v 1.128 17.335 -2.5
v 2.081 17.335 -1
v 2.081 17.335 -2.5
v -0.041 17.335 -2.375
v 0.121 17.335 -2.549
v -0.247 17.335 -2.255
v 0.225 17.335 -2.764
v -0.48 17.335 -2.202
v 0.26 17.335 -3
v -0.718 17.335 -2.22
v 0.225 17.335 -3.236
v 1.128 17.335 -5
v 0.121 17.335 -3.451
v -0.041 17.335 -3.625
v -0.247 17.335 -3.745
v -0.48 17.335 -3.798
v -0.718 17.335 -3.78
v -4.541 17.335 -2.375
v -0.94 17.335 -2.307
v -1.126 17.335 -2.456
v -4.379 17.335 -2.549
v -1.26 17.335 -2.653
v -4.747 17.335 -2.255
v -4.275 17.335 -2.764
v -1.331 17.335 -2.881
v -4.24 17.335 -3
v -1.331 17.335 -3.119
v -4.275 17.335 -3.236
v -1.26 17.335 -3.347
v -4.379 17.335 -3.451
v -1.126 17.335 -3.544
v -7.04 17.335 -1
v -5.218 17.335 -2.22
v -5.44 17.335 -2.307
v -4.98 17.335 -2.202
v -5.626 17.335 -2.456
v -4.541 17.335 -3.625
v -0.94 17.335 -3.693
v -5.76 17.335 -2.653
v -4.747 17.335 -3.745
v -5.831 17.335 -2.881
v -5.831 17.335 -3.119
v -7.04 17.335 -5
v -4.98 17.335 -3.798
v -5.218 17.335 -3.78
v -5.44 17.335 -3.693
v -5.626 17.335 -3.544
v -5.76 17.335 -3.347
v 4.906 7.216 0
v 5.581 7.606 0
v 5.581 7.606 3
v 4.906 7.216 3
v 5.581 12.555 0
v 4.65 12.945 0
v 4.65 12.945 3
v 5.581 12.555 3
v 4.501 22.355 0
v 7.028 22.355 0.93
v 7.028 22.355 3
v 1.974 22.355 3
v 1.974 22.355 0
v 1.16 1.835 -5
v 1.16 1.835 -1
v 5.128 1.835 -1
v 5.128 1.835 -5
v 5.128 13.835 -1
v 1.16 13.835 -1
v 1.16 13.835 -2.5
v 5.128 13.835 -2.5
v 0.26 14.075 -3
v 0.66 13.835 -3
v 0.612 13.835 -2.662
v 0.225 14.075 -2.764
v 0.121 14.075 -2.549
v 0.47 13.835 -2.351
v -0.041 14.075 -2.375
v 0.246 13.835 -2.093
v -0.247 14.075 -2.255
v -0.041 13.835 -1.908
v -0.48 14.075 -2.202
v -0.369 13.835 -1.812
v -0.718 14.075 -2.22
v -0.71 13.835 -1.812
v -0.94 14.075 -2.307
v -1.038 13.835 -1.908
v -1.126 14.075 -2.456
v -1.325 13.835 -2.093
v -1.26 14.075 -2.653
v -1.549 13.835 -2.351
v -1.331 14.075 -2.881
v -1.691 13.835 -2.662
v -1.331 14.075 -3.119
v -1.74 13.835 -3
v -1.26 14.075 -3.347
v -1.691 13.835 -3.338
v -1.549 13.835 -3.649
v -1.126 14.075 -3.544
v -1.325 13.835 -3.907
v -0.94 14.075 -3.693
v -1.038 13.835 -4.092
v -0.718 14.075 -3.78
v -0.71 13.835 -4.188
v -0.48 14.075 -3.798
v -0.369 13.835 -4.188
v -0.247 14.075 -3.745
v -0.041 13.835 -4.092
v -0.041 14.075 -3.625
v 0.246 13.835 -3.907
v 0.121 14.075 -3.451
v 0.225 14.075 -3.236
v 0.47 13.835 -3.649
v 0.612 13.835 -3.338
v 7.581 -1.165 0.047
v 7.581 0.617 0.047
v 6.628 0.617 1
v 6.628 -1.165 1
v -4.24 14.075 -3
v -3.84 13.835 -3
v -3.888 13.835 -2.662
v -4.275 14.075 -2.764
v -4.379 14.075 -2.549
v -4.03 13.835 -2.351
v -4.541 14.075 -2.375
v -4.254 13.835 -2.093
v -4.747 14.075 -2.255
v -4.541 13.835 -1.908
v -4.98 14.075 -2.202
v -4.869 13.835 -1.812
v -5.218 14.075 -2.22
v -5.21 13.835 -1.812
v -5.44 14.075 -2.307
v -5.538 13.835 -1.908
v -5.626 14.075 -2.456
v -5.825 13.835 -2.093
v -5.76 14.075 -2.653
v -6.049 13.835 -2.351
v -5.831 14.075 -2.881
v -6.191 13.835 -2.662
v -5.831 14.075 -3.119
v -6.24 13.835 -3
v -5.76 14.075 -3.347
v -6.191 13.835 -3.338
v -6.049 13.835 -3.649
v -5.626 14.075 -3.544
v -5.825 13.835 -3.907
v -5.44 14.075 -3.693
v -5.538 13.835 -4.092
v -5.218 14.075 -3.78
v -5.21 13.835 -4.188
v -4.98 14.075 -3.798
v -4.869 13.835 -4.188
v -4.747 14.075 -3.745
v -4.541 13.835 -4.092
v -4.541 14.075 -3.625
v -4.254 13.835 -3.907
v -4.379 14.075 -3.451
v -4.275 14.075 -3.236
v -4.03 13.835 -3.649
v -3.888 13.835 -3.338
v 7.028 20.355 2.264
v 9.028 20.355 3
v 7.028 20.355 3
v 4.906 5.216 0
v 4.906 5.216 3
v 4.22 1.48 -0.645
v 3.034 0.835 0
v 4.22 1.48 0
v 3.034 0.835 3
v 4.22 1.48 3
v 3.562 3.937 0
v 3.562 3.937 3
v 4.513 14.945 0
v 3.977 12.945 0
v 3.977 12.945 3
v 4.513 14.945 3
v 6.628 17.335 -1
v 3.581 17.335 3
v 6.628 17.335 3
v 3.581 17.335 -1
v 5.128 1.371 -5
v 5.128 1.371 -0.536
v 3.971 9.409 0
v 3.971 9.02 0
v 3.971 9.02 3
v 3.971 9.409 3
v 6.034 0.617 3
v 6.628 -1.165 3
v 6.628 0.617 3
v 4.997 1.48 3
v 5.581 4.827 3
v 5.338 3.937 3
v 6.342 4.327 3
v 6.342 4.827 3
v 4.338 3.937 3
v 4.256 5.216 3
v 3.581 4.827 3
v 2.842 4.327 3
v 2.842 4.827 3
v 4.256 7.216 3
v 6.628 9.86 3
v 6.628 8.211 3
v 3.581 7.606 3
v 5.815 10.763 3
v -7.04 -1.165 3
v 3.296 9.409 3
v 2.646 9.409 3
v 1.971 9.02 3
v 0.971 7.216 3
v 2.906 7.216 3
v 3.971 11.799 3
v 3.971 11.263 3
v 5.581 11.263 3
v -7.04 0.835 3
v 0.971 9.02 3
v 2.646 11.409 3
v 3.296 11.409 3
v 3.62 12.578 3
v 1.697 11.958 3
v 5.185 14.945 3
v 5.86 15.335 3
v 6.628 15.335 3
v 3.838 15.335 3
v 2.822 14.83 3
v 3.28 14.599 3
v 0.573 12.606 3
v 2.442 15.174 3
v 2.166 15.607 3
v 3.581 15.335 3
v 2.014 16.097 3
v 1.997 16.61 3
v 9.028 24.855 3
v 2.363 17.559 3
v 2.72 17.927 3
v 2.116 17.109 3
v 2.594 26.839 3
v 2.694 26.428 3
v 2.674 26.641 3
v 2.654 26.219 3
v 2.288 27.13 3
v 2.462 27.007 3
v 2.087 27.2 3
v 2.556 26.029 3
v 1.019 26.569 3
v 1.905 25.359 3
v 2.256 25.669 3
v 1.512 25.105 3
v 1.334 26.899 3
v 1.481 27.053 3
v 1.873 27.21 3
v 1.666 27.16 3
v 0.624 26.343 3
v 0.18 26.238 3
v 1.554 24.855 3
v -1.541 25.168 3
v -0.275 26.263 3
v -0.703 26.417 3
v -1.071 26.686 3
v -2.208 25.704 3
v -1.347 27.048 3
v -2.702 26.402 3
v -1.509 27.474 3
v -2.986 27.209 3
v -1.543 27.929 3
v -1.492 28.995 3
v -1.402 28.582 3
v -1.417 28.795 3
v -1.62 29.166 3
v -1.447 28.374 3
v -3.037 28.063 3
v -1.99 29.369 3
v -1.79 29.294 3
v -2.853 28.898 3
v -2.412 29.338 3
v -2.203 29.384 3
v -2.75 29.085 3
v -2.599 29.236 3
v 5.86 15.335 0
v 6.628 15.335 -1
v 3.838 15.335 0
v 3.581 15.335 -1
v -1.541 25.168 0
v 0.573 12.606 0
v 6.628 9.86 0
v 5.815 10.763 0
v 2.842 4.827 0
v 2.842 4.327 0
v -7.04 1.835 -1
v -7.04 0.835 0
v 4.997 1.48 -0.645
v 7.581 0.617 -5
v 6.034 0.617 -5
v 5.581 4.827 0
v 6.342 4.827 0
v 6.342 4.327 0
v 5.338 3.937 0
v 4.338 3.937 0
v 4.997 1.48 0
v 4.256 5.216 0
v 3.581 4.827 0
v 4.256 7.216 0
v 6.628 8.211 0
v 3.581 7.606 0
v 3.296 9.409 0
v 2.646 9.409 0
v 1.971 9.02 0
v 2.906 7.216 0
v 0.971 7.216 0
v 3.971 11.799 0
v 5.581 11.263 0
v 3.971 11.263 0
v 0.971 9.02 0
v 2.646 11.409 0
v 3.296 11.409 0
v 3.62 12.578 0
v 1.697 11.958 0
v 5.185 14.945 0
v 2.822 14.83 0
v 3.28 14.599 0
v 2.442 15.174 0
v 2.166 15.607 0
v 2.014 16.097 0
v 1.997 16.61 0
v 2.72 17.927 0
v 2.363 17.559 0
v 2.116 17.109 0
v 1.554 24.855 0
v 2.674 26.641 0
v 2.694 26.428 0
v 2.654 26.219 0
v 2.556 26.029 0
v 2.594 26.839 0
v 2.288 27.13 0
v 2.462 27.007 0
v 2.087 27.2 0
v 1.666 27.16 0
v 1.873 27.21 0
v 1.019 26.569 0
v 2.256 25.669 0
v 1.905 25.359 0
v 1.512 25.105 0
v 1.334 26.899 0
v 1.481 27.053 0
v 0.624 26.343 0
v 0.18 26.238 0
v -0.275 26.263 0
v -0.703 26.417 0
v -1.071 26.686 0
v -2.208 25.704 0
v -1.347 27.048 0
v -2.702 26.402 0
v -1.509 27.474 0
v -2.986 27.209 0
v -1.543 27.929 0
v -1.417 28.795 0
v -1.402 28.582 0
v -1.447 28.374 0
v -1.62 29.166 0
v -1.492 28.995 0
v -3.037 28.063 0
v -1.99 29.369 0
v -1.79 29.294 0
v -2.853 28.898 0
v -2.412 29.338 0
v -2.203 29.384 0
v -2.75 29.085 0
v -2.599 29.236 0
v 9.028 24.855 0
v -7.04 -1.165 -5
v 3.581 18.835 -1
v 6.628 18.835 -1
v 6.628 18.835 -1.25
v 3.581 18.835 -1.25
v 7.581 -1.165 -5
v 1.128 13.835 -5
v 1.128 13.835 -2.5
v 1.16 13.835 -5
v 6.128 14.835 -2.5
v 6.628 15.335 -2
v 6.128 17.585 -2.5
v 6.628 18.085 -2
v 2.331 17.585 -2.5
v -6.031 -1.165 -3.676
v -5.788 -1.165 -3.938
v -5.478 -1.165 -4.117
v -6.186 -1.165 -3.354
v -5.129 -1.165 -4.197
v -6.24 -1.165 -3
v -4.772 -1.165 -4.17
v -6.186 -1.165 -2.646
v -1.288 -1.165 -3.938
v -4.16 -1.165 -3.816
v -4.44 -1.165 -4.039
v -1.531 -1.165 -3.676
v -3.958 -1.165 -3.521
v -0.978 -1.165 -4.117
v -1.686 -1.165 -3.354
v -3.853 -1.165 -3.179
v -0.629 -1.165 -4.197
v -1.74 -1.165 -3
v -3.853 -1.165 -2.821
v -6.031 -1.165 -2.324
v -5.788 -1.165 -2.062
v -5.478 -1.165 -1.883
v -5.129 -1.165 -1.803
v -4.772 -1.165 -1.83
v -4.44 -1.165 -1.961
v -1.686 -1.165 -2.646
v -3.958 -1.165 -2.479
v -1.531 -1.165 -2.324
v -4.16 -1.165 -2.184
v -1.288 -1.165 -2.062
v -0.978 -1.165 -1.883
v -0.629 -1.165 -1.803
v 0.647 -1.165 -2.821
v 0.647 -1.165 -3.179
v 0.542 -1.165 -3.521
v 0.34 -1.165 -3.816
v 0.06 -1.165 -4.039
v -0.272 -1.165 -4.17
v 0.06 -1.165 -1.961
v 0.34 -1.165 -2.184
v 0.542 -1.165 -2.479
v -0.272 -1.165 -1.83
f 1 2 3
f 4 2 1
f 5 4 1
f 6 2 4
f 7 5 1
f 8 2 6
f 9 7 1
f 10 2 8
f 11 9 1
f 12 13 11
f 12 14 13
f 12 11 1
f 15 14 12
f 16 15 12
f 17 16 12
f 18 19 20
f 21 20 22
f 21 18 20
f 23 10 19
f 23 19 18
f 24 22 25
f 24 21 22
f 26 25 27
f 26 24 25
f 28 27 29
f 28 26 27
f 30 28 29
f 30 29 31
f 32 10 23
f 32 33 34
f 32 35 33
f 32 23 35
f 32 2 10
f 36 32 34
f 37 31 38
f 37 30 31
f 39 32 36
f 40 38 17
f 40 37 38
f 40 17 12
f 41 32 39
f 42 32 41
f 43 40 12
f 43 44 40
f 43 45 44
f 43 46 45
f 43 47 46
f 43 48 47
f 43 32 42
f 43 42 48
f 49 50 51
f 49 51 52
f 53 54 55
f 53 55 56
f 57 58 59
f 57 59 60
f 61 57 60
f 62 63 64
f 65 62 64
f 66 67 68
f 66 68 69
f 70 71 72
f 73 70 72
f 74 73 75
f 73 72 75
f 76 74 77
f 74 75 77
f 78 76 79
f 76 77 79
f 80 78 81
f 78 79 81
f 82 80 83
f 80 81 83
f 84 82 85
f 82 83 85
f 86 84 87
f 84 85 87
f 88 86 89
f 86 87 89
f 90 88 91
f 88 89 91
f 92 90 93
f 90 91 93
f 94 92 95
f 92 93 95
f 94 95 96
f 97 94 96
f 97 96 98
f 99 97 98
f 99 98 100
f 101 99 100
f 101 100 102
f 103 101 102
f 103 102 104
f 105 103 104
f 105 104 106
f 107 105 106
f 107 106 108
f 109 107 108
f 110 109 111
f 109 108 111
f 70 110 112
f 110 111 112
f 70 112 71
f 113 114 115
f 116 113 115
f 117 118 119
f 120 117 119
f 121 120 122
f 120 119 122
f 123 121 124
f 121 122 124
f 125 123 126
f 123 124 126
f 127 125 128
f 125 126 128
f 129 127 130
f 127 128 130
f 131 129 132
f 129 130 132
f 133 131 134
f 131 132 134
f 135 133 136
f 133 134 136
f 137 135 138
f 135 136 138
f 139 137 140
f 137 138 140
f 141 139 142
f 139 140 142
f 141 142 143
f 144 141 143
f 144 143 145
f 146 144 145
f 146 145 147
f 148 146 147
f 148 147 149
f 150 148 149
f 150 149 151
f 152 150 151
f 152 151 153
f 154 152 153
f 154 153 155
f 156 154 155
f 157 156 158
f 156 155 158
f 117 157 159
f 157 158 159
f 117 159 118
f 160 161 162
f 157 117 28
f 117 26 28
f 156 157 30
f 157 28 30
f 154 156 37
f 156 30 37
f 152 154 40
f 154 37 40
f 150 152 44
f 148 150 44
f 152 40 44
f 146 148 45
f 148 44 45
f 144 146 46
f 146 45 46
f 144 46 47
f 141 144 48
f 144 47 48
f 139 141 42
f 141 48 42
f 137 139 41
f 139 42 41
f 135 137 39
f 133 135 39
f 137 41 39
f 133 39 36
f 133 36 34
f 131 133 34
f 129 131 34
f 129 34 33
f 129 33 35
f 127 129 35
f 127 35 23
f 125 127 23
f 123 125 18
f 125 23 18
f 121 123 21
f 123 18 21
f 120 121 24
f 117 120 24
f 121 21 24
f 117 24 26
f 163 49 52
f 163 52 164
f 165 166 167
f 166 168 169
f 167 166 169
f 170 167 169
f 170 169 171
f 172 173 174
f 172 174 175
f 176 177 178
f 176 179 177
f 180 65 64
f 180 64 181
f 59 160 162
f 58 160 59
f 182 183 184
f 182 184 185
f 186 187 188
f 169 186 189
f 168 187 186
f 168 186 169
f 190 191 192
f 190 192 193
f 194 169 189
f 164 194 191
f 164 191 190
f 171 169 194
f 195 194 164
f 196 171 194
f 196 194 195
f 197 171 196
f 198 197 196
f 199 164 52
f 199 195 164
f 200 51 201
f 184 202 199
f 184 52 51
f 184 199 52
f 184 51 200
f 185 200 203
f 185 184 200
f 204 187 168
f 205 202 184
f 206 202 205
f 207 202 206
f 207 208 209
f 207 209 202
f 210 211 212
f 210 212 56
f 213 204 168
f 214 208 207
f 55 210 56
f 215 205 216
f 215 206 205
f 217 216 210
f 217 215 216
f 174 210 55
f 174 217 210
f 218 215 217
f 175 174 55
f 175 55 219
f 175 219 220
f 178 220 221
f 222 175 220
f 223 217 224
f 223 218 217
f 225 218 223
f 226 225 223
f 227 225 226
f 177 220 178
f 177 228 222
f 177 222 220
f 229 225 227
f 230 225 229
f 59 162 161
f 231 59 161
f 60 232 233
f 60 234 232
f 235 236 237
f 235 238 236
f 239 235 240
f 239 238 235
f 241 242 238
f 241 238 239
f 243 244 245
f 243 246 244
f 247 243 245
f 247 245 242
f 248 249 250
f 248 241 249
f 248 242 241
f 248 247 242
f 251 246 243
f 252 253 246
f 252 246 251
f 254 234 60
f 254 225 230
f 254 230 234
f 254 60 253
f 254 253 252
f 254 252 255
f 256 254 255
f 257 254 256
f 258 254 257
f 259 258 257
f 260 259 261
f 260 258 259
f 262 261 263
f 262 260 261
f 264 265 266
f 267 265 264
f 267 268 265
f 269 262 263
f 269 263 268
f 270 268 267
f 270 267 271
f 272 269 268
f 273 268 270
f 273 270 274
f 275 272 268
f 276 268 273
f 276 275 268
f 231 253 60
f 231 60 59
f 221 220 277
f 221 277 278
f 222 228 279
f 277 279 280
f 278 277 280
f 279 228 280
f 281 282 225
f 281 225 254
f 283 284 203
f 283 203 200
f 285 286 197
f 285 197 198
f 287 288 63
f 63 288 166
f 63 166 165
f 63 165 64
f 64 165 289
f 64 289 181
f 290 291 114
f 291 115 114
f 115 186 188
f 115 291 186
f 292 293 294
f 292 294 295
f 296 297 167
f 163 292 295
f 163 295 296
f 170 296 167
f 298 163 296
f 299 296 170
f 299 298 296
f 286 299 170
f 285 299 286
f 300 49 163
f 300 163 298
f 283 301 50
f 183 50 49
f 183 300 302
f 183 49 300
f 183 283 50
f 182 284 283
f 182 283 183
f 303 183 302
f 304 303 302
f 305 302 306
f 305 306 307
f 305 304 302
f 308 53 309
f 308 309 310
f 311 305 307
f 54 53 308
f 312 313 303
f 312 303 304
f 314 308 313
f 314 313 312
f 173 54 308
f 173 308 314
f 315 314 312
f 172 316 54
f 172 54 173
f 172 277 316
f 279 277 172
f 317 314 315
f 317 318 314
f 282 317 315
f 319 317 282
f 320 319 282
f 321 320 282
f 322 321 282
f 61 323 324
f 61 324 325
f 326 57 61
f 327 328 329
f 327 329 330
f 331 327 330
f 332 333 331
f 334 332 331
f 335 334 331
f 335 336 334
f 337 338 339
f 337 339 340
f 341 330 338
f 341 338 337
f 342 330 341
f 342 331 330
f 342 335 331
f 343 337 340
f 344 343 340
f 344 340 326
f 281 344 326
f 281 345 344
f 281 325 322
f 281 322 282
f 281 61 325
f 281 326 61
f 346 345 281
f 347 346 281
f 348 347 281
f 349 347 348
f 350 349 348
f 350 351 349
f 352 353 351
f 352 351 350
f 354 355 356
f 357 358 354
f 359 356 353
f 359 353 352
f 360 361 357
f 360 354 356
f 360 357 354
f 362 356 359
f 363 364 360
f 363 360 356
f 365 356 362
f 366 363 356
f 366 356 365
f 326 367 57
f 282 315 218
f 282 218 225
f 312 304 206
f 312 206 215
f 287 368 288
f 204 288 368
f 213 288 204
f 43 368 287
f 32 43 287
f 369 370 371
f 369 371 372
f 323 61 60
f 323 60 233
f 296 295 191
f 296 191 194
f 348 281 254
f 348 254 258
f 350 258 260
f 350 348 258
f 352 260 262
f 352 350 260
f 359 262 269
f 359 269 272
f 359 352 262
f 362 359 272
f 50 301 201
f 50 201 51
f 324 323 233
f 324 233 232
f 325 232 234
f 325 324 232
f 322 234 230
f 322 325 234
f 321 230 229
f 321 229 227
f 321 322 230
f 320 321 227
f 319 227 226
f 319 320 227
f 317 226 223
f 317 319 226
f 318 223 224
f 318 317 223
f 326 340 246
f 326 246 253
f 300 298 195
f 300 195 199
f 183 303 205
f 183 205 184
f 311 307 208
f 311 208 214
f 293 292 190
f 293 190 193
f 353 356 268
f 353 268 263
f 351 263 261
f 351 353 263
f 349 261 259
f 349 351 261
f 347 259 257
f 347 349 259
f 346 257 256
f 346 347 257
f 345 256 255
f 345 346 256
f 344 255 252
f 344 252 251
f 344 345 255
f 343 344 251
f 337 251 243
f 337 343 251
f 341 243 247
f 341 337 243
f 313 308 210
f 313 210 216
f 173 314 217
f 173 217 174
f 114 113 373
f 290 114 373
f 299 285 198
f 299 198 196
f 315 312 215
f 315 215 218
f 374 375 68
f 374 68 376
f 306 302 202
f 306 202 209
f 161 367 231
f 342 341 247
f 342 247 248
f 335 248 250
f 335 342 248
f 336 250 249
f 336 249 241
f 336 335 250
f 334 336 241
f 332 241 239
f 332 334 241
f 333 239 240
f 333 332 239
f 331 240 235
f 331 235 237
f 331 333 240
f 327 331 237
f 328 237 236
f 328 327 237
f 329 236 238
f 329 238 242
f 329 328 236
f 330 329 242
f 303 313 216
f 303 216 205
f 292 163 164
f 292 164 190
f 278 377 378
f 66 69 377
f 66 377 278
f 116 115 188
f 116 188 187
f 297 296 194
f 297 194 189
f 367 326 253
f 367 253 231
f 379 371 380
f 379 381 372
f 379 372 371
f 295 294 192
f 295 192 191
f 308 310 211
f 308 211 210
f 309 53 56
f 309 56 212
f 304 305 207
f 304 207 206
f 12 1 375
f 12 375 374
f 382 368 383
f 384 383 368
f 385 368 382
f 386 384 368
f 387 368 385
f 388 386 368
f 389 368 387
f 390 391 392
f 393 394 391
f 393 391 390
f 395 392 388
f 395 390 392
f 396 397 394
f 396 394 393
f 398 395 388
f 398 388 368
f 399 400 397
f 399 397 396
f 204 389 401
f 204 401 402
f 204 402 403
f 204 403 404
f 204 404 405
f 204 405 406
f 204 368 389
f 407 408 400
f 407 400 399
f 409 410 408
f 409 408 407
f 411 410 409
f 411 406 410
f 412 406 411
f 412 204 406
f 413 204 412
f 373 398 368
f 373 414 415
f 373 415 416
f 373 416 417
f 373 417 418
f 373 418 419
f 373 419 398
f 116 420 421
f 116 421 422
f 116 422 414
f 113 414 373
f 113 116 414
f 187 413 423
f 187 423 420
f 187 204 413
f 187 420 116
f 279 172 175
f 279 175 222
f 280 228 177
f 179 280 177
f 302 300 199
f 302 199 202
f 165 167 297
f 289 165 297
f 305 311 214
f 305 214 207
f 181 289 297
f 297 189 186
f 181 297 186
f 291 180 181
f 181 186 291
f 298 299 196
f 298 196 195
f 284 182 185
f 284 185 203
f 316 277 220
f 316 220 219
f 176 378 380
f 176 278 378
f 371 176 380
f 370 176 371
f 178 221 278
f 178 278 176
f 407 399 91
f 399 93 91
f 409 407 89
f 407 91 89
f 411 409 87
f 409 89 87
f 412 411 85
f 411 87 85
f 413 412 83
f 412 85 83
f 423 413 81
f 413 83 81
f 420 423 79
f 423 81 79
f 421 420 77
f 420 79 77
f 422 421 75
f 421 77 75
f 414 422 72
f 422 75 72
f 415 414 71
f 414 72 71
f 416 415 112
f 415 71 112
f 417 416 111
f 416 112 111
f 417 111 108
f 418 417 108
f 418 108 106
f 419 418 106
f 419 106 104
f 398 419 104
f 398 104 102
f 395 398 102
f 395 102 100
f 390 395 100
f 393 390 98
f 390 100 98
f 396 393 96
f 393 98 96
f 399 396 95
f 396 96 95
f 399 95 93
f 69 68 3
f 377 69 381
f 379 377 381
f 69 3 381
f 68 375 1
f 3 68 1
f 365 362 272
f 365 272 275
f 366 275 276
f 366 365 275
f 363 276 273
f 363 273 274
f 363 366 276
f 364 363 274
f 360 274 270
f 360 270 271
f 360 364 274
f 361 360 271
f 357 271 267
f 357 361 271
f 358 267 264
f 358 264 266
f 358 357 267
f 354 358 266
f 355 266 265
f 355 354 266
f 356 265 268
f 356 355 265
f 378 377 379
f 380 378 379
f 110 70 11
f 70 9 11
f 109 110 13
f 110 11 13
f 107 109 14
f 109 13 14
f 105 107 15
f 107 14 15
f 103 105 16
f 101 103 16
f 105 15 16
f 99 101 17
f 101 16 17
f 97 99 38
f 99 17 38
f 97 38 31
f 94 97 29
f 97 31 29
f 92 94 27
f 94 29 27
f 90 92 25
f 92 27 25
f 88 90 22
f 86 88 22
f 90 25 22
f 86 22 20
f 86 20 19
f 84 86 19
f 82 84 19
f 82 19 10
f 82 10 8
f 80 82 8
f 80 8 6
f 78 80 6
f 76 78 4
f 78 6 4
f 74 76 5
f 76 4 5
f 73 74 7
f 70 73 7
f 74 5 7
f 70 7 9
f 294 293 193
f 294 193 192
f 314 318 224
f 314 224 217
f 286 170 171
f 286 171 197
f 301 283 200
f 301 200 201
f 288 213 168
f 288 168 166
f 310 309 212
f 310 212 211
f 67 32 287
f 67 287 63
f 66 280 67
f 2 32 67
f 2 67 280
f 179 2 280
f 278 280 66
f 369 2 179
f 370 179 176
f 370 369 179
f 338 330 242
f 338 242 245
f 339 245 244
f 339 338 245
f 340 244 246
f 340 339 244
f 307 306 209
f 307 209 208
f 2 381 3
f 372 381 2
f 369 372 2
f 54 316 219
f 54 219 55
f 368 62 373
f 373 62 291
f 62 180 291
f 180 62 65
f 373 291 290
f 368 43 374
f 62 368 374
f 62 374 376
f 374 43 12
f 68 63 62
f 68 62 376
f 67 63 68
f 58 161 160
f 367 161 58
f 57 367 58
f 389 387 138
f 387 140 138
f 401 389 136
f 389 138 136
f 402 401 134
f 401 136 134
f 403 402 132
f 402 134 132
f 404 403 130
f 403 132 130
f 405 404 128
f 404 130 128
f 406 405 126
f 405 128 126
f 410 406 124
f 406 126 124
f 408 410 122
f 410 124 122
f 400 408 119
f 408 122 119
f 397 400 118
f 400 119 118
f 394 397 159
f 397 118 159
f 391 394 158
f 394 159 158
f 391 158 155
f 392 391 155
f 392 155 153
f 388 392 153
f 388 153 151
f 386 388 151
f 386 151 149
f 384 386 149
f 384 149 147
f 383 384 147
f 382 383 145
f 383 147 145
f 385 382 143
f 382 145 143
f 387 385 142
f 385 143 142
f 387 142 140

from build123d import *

# Parameters (mm, degrees)
BOSS_SWITCH_BODY_DEPTH                    = 3
SKETCH1_W                                 = 4
SKETCH1_H                                 = 3.5
BOSS_FLANGE_WIDTH_DEPTH                   = 5
BOSS_FLANGE_HEIGHT_REACH                  = 35.863
SKETCH2_W                                 = 4
SKETCH2_H                                 = 2
SKETCH2_W_2                               = 8
CUT_UP_TO_DOWN_DERAILLEUR_CLEARANCE_REACH = 21.462
SKETCH10_W                                = 2.453096586
SKETCH10_H                                = 3
SKETCH17_W                                = 12.1675
SKETCH17_H                                = 4
BOSS_FLANGE_SUPPORT_DEPTH                 = 14.499999955
TAP_DRILL_FOR_M2X0_4_TAP1_D               = 1.6
M2_CLEARANCE_HOLE2_D                      = 2.4
M2_CLEARANCE_HOLE2_DEPTH                  = 15
M2_CLEARANCE_HOLE2_TIP                    = 0.721032743
CHAMFER_FLANGE_SUPPORT_SIZE               = 1.5
CHAMFER_FLANGE_SUPPORT_2_SIZE             = 1.5
CHAMFER_FLANGE_SUPPORT_3_SIZE             = 1
SKETCH23_W                                = 3.9675
SKETCH23_H                                = 11.999999954
CUT_GAP_FOR_PRINTING_DEPTH                = 32.000499688
SKETCH25_W                                = 0.953096586
SKETCH25_H                                = 3.5
CUT_DERAILLEUR_CLEARANCE_DEPTH            = 32.145320369
CHAMFER8_SIZE                             = 1
CUT_UP_TO_DOWN_CANTILEVER_SLOPE_REACH     = 31.869
SKETCH26_W                                = 12.477246204
SKETCH26_H                                = 5.771077126
CUT_WIDE_DERAILLEUR_CLEARANCE_DEPTH       = 33.195879702
CUT_WIDE_DERAILLEUR_CLEARANCE_DEPTH_BACK  = 4
SKETCH27_W                                = 2.5
SKETCH27_H                                = 5.000000046
CHAMFER9_SIZE                             = 1.25
SKETCH28_W                                = 3.046903414
SKETCH28_H                                = 1.5
CUT_EXTRUDE1_DEPTH                        = 1


# Some blends are built 0.0001 mm under size
with BuildPart() as part:
    # Sketch-SwitchBossUp → Boss-Switch Body (new body)
    with BuildSketch(Plane.XY):
        with BuildLine():
            Line((5.581091201, 12.55524379), (5.581100766, 11.263016279))
            Line((5.581100766, 11.263016279), (3.971265023, 11.263016279))
            Line((3.971265023, 11.263016279), (3.97126394, 11.79911022))
            Line((3.97126394, 11.79911022), (3.296271341, 11.409403061))
            Line((3.296271341, 11.409403061), (3.296271341, 9.409403061))
            Line((3.296271341, 9.409403061), (3.971278743, 9.019687356))
            Line((3.971278743, 9.019687356), (3.971278743, 9.409408058))
            Line((3.971278743, 9.409408058), (5.815189336, 10.763016279))
            Line((5.815189336, 10.763016279), (6.627976927, 9.860324207))
            Line((6.627976927, 9.860324207), (6.627976927, 8.210536506))
            Line((6.627976927, 8.210536506), (5.581127833, 7.606137899))
            Line((5.581127833, 7.606137899), (4.906138119, 7.216432406))
            Line((4.906138119, 7.216432406), (4.906138119, 5.216432406))
            Line((4.906138119, 5.216432406), (5.58114552, 4.826716701))
            Line((5.58114552, 4.826716701), (6.342350466, 4.826716701))
            Line((6.342350466, 4.826716701), (6.342350466, 4.326716701))
            Line((6.342350466, 4.326716701), (5.338261222, 3.937018274))
            Line((5.338261222, 3.937018274), (4.338261222, 3.937018274))
            Line((4.338261222, 3.937018274), (4.996687221, 1.479738993))
            Line((4.996687221, 1.479738993), (6.034464198, 0.616519013))
            Line((6.034464198, 0.616519013), (6.627976927, 0.616519013))
            Line((6.627976927, 0.616519013), (6.627976927, -1.165310653))
            Line((6.627976927, -1.165310653), (3.034464198, -1.165310653))
            Line((3.034464198, -1.165310653), (3.034464198, 0.834689347))
            Line((3.034464198, 0.834689347), (4.220230086, 1.479738993))
            Line((4.220230086, 1.479738993), (3.561804087, 3.937018274))
            Line((3.561804087, 3.937018274), (2.842350466, 4.326720436))
            Line((2.842350466, 4.326720436), (2.842350466, 4.826720436))
            Line((2.842350466, 4.826720436), (3.58114552, 4.826720436))
            Line((3.58114552, 4.826720436), (4.256138119, 5.216427595))
            Line((4.256138119, 5.216427595), (4.256138119, 7.216427595))
            Line((4.256138119, 7.216427595), (3.581130717, 7.6061433))
            Line((3.581130717, 7.6061433), (2.9061262, 7.216422599))
            Line((2.9061262, 7.216422599), (0.971281627, 7.216422599))
            Line((0.971281627, 7.216422599), (0.971281627, 9.019692757))
            Line((0.971281627, 9.019692757), (1.971281627, 9.019692757))
            Line((1.971281627, 9.019692757), (2.646271341, 9.40939825))
            Line((2.646271341, 9.40939825), (2.646271341, 11.40939825))
            Line((2.646271341, 11.40939825), (1.696557212, 11.957715958))
            Line((1.696557212, 11.957715958), (0.573317845, 12.60621851))
            Line((0.573317845, 12.60621851), (-1.541303694, 25.167805745))
            ThreePointArc((-1.541303694, 25.167805745), (-2.872284003, 26.795385437), (-2.852546321, 28.897797067))
            ThreePointArc((-2.852546321, 28.897797067), (-1.887813913, 29.338582026), (-1.447028953, 28.373849618))
            ThreePointArc((-1.447028953, 28.373849618), (-0.703448682, 26.416936722), (1.333779254, 26.898727173))
            ThreePointArc((1.333779254, 26.898727173), (2.379722745, 27.074801628), (2.555797201, 26.028858137))
            ThreePointArc((2.555797201, 26.028858137), (2.086504637, 25.507104397), (1.511513111, 25.104801997))
            Line((1.511513111, 25.104801997), (1.553598189, 24.854801997))
            Line((1.553598189, 24.854801997), (9.027976927, 24.854801997))
            Line((9.027976927, 24.854801997), (9.027976927, 22.354801997))
            Line((9.027976927, 22.354801997), (9.027976927, 20.354801997))
            Line((9.027976927, 20.354801997), (7.027976927, 20.354801997))
            Line((7.027976927, 20.354801997), (7.027976927, 22.354801997))
            Line((7.027976927, 22.354801997), (1.974448974, 22.354801997))
            Line((1.974448974, 22.354801997), (2.719778232, 17.927287042))
            ThreePointArc((2.719778232, 17.927287042), (2.013826204, 16.096957693), (3.280124137, 14.598637521))
            Line((3.280124137, 14.598637521), (3.620297651, 12.577888564))
            Line((3.620297651, 12.577888564), (3.976674365, 12.944956135))
            Line((3.976674365, 12.944956135), (4.512557947, 14.944960101))
            Line((4.512557947, 14.944960101), (3.837515632, 15.334689301))
            Line((3.837515632, 15.334689301), (3.581073513, 15.334689301))
            Line((3.581073513, 15.334689301), (3.581073513, 17.334689301))
            Line((3.581073513, 17.334689301), (5.725580434, 17.334689301))
            Line((5.725580434, 17.334689301), (6.627976927, 17.334689301))
            Line((6.627976927, 17.334689301), (6.627976927, 15.334689301))
            Line((6.627976927, 15.334689301), (5.860498075, 15.334689301))
            Line((5.860498075, 15.334689301), (5.185487464, 14.944965082))
            Line((5.185487464, 14.944965082), (4.649603883, 12.944961115))
            Line((4.649603883, 12.944961115), (5.581091201, 12.55524379))
        make_face()
    extrude(amount=BOSS_SWITCH_BODY_DEPTH)

    # Sketch1 → Boss-Flange Width (add)
    with BuildSketch(Plane(origin=(0, 0, 0), x_dir=(-1, 0, 0), z_dir=(0, 0, -1))):
        Polygon((-7.581073513, -1.165310653), (0.412170615, -1.165310653), (0.412170615, 0.834689347), (-3.034464198, 0.834689347), (-4.220230086, 1.479738993), (-4.996687221, 1.479738993), (-6.034464198, 0.616519013), (-7.581073513, 0.616519013), align=None)
        with Locations((-5.581073513, 17.084689301)):
            Rectangle(SKETCH1_W, SKETCH1_H)
    extrude(amount=BOSS_FLANGE_WIDTH_DEPTH)

    # Sketch2 → Boss-Flange Height (add, up to next)
    with BuildSketch(Plane(origin=(-7.039523073, 0, 0), x_dir=(0, 0, -1), z_dir=(1, 0, 0)), mode=Mode.PRIVATE) as boss_flange_height_sk1:
        with Locations((3, 16.334689301)):
            Rectangle(SKETCH2_W, SKETCH2_H)
    boss_flange_height_tool1 = extrude(boss_flange_height_sk1.sketch, amount=BOSS_FLANGE_HEIGHT_REACH, mode=Mode.PRIVATE) - part.part
    # Sketch2 → Boss-Flange Height (add, up to next)
    with BuildSketch(Plane(origin=(-7.039523073, 0, 0), x_dir=(0, 0, -1), z_dir=(1, 0, 0)), mode=Mode.PRIVATE) as boss_flange_height_sk2:
        with Locations((1, -0.165310653)):
            Rectangle(SKETCH2_W_2, SKETCH2_H)
    boss_flange_height_tool2 = extrude(boss_flange_height_sk2.sketch, amount=BOSS_FLANGE_HEIGHT_REACH, mode=Mode.PRIVATE) - part.part
    add(boss_flange_height_tool1.solids().sort_by_distance((-7.039523, 16.334689, -3))[0])
    add(boss_flange_height_tool2.solids().sort_by_distance((-7.039523, -0.165311, -1))[0])

    # Sketch10 → Cut-Up-To-Down Derailleur Clearance (cut, up to next)
    with BuildSketch(Plane(origin=(0, 15.334689301, 0), x_dir=(1, 0, 0), z_dir=(0, 1, 0)), mode=Mode.PRIVATE) as cut_up_to_down_derailleur_clearance_sk1:
        with Locations((6.35452522, 3.5)):
            Rectangle(SKETCH10_W, SKETCH10_H)
    cut_up_to_down_derailleur_clearance_tool1 = extrude(cut_up_to_down_derailleur_clearance_sk1.sketch, amount=CUT_UP_TO_DOWN_DERAILLEUR_CLEARANCE_REACH, mode=Mode.PRIVATE) & part.part
    add(cut_up_to_down_derailleur_clearance_tool1.solids().sort_by_distance((6.354525, 15.334689, -3.5))[0], mode=Mode.SUBTRACT)

    # Sketch17 → Boss-Flange Support (add)
    with BuildSketch(Plane.XZ.offset(-15.334689301)):
        with Locations((-0.955773073, -3)):
            Rectangle(SKETCH17_W, SKETCH17_H)
    extrude(amount=BOSS_FLANGE_SUPPORT_DEPTH)

    # Tap Drill for M2x0.4 Tap1 (through all)
    with Locations(Plane(origin=(0, -1.165310653, 0), x_dir=(-1, 0, 0), z_dir=(0, -1, 0))):
        with Locations((5.039523073, 3), (0.539523073, 3)):
            Hole(TAP_DRILL_FOR_M2X0_4_TAP1_D / 2)

    # M2 Clearance Hole2
    with Locations(Plane.XZ.offset(1.165310653)):
        with Locations((-5.039523073, -3), (-0.539523073, -3)):
            Hole(M2_CLEARANCE_HOLE2_D / 2, depth=M2_CLEARANCE_HOLE2_DEPTH)
            with Locations((0, 0, -(M2_CLEARANCE_HOLE2_DEPTH + M2_CLEARANCE_HOLE2_TIP / 2))):  # 118° drill point
                Cone(0, M2_CLEARANCE_HOLE2_D / 2, M2_CLEARANCE_HOLE2_TIP, mode=Mode.SUBTRACT)

    # Chamfer-Flange Support
    chamfer_flange_support_edges = [part.edges().sort_by_distance(p)[0] for p in [
        (3.581073513, 17.334689301, -3),
    ]]
    chamfer(chamfer_flange_support_edges, length=CHAMFER_FLANGE_SUPPORT_SIZE - 0.0001)  # a hair under: the kernel refuses the full size

    # Chamfer-Flange Support 2
    chamfer_flange_support_2_edges = [part.edges().sort_by_distance(p)[0] for p in [
        (5.127976927, 17.084689301, -2),
        (5.127976927, 15.334689301, -1.5),
    ]]
    chamfer(chamfer_flange_support_2_edges, length=CHAMFER_FLANGE_SUPPORT_2_SIZE)

    # Chamfer-Flange Support 3
    chamfer_flange_support_3_edges = [part.edges().sort_by_distance(p)[0] for p in [
        (-2.002529437, 0.834689346, -1),
    ]]
    chamfer(chamfer_flange_support_3_edges, length=CHAMFER_FLANGE_SUPPORT_3_SIZE)

    # Sketch23 → Cut-Gap for Printing (cut, through all)
    with BuildSketch(Plane.XY.offset(-1)):
        with Locations((3.144226927, 7.834689324)):
            Rectangle(SKETCH23_W, SKETCH23_H)
    extrude(amount=-CUT_GAP_FOR_PRINTING_DEPTH, mode=Mode.SUBTRACT)

    # Sketch25 → Cut-Derailleur Clearance (cut, through all)
    with BuildSketch(Plane.XY):
        with Locations((7.10452522, 17.084689301)):
            Rectangle(SKETCH25_W, SKETCH25_H)
    extrude(amount=-CUT_DERAILLEUR_CLEARANCE_DEPTH, mode=Mode.SUBTRACT)

    # Chamfer8
    # the kernel refuses this chamfer: 1 mm, written as the material it adds along each edge
    with BuildSketch(Plane(origin=(6.627976927, 0.616519013, 0), x_dir=(0.9996219169112968, -2.9896548410572577e-15, -0.027495876610586365), z_dir=(0, -1, 0))) as chamfer8_piece_1_section:
        Polygon((CHAMFER8_SIZE * 0.999621916911, CHAMFER8_SIZE * 0.0274958766106), (-CHAMFER8_SIZE * 0.0274958766106, CHAMFER8_SIZE * 0.999621916911), (0, 0), align=None)
    chamfer8_piece_1 = extrude(amount=1.781829666, mode=Mode.PRIVATE)
    chamfer8_piece_1 = split(chamfer8_piece_1, bisect_by=Plane(origin=(7.581073513, -0.27439582, 0.332375145), z_dir=(-1, 0, 0)), keep=Keep.TOP, mode=Mode.PRIVATE)
    add(chamfer8_piece_1)

    # Sketch26 → Cut-Up-to-Down Cantilever Slope (cut, up to next)
    with BuildSketch(Plane(origin=(-3.086642121, 5.589000146, 8.383500218), x_dir=(-0.9561404375276108, -0.1624764728289173, -0.24371470924337582), z_dir=(0.2929086269205964, -0.5303712883154423, -0.795556932473163)), mode=Mode.PRIVATE) as cut_up_to_down_cantilever_slope_sk1:
        with Locations((-13.791615152, 17.794906754)):
            Rectangle(SKETCH26_W, SKETCH26_H)
    cut_up_to_down_cantilever_slope_tool1 = extrude(cut_up_to_down_cantilever_slope_sk1.sketch, amount=CUT_UP_TO_DOWN_CANTILEVER_SLOPE_REACH, mode=Mode.PRIVATE) & part.part
    add(cut_up_to_down_cantilever_slope_tool1.solids().sort_by_distance((10.100079, 22.636071, 1.873881))[0], mode=Mode.SUBTRACT)

    # Sketch27 → Cut-Wide Derailleur Clearance (cut, two sides: drawn at the far end of the back side and taken through both)
    with BuildSketch(Plane(origin=(5.127976927, 0, 0), x_dir=(0, 0, -1), z_dir=(1, 0, 0)).offset(-CUT_WIDE_DERAILLEUR_CLEARANCE_DEPTH_BACK)):
        with Locations((3.75, 16.334689324)):
            Rectangle(SKETCH27_W, SKETCH27_H)
    extrude(amount=CUT_WIDE_DERAILLEUR_CLEARANCE_DEPTH + CUT_WIDE_DERAILLEUR_CLEARANCE_DEPTH_BACK, mode=Mode.SUBTRACT)

    # Chamfer9
    chamfer9_edges = [part.edges().sort_by_distance(p)[0] for p in [
        (4.85452522, 18.834689347, -2.5),
    ]]
    chamfer(chamfer9_edges, length=CHAMFER9_SIZE)

    # Sketch28 → Cut-Extrude1 (cut)
    with BuildSketch(Plane.XY.offset(-1)):
        with Locations((5.10452522, 18.084689301)):
            Rectangle(SKETCH28_W, SKETCH28_H)
    extrude(amount=CUT_EXTRUDE1_DEPTH, mode=Mode.SUBTRACT)


solid = part.part
